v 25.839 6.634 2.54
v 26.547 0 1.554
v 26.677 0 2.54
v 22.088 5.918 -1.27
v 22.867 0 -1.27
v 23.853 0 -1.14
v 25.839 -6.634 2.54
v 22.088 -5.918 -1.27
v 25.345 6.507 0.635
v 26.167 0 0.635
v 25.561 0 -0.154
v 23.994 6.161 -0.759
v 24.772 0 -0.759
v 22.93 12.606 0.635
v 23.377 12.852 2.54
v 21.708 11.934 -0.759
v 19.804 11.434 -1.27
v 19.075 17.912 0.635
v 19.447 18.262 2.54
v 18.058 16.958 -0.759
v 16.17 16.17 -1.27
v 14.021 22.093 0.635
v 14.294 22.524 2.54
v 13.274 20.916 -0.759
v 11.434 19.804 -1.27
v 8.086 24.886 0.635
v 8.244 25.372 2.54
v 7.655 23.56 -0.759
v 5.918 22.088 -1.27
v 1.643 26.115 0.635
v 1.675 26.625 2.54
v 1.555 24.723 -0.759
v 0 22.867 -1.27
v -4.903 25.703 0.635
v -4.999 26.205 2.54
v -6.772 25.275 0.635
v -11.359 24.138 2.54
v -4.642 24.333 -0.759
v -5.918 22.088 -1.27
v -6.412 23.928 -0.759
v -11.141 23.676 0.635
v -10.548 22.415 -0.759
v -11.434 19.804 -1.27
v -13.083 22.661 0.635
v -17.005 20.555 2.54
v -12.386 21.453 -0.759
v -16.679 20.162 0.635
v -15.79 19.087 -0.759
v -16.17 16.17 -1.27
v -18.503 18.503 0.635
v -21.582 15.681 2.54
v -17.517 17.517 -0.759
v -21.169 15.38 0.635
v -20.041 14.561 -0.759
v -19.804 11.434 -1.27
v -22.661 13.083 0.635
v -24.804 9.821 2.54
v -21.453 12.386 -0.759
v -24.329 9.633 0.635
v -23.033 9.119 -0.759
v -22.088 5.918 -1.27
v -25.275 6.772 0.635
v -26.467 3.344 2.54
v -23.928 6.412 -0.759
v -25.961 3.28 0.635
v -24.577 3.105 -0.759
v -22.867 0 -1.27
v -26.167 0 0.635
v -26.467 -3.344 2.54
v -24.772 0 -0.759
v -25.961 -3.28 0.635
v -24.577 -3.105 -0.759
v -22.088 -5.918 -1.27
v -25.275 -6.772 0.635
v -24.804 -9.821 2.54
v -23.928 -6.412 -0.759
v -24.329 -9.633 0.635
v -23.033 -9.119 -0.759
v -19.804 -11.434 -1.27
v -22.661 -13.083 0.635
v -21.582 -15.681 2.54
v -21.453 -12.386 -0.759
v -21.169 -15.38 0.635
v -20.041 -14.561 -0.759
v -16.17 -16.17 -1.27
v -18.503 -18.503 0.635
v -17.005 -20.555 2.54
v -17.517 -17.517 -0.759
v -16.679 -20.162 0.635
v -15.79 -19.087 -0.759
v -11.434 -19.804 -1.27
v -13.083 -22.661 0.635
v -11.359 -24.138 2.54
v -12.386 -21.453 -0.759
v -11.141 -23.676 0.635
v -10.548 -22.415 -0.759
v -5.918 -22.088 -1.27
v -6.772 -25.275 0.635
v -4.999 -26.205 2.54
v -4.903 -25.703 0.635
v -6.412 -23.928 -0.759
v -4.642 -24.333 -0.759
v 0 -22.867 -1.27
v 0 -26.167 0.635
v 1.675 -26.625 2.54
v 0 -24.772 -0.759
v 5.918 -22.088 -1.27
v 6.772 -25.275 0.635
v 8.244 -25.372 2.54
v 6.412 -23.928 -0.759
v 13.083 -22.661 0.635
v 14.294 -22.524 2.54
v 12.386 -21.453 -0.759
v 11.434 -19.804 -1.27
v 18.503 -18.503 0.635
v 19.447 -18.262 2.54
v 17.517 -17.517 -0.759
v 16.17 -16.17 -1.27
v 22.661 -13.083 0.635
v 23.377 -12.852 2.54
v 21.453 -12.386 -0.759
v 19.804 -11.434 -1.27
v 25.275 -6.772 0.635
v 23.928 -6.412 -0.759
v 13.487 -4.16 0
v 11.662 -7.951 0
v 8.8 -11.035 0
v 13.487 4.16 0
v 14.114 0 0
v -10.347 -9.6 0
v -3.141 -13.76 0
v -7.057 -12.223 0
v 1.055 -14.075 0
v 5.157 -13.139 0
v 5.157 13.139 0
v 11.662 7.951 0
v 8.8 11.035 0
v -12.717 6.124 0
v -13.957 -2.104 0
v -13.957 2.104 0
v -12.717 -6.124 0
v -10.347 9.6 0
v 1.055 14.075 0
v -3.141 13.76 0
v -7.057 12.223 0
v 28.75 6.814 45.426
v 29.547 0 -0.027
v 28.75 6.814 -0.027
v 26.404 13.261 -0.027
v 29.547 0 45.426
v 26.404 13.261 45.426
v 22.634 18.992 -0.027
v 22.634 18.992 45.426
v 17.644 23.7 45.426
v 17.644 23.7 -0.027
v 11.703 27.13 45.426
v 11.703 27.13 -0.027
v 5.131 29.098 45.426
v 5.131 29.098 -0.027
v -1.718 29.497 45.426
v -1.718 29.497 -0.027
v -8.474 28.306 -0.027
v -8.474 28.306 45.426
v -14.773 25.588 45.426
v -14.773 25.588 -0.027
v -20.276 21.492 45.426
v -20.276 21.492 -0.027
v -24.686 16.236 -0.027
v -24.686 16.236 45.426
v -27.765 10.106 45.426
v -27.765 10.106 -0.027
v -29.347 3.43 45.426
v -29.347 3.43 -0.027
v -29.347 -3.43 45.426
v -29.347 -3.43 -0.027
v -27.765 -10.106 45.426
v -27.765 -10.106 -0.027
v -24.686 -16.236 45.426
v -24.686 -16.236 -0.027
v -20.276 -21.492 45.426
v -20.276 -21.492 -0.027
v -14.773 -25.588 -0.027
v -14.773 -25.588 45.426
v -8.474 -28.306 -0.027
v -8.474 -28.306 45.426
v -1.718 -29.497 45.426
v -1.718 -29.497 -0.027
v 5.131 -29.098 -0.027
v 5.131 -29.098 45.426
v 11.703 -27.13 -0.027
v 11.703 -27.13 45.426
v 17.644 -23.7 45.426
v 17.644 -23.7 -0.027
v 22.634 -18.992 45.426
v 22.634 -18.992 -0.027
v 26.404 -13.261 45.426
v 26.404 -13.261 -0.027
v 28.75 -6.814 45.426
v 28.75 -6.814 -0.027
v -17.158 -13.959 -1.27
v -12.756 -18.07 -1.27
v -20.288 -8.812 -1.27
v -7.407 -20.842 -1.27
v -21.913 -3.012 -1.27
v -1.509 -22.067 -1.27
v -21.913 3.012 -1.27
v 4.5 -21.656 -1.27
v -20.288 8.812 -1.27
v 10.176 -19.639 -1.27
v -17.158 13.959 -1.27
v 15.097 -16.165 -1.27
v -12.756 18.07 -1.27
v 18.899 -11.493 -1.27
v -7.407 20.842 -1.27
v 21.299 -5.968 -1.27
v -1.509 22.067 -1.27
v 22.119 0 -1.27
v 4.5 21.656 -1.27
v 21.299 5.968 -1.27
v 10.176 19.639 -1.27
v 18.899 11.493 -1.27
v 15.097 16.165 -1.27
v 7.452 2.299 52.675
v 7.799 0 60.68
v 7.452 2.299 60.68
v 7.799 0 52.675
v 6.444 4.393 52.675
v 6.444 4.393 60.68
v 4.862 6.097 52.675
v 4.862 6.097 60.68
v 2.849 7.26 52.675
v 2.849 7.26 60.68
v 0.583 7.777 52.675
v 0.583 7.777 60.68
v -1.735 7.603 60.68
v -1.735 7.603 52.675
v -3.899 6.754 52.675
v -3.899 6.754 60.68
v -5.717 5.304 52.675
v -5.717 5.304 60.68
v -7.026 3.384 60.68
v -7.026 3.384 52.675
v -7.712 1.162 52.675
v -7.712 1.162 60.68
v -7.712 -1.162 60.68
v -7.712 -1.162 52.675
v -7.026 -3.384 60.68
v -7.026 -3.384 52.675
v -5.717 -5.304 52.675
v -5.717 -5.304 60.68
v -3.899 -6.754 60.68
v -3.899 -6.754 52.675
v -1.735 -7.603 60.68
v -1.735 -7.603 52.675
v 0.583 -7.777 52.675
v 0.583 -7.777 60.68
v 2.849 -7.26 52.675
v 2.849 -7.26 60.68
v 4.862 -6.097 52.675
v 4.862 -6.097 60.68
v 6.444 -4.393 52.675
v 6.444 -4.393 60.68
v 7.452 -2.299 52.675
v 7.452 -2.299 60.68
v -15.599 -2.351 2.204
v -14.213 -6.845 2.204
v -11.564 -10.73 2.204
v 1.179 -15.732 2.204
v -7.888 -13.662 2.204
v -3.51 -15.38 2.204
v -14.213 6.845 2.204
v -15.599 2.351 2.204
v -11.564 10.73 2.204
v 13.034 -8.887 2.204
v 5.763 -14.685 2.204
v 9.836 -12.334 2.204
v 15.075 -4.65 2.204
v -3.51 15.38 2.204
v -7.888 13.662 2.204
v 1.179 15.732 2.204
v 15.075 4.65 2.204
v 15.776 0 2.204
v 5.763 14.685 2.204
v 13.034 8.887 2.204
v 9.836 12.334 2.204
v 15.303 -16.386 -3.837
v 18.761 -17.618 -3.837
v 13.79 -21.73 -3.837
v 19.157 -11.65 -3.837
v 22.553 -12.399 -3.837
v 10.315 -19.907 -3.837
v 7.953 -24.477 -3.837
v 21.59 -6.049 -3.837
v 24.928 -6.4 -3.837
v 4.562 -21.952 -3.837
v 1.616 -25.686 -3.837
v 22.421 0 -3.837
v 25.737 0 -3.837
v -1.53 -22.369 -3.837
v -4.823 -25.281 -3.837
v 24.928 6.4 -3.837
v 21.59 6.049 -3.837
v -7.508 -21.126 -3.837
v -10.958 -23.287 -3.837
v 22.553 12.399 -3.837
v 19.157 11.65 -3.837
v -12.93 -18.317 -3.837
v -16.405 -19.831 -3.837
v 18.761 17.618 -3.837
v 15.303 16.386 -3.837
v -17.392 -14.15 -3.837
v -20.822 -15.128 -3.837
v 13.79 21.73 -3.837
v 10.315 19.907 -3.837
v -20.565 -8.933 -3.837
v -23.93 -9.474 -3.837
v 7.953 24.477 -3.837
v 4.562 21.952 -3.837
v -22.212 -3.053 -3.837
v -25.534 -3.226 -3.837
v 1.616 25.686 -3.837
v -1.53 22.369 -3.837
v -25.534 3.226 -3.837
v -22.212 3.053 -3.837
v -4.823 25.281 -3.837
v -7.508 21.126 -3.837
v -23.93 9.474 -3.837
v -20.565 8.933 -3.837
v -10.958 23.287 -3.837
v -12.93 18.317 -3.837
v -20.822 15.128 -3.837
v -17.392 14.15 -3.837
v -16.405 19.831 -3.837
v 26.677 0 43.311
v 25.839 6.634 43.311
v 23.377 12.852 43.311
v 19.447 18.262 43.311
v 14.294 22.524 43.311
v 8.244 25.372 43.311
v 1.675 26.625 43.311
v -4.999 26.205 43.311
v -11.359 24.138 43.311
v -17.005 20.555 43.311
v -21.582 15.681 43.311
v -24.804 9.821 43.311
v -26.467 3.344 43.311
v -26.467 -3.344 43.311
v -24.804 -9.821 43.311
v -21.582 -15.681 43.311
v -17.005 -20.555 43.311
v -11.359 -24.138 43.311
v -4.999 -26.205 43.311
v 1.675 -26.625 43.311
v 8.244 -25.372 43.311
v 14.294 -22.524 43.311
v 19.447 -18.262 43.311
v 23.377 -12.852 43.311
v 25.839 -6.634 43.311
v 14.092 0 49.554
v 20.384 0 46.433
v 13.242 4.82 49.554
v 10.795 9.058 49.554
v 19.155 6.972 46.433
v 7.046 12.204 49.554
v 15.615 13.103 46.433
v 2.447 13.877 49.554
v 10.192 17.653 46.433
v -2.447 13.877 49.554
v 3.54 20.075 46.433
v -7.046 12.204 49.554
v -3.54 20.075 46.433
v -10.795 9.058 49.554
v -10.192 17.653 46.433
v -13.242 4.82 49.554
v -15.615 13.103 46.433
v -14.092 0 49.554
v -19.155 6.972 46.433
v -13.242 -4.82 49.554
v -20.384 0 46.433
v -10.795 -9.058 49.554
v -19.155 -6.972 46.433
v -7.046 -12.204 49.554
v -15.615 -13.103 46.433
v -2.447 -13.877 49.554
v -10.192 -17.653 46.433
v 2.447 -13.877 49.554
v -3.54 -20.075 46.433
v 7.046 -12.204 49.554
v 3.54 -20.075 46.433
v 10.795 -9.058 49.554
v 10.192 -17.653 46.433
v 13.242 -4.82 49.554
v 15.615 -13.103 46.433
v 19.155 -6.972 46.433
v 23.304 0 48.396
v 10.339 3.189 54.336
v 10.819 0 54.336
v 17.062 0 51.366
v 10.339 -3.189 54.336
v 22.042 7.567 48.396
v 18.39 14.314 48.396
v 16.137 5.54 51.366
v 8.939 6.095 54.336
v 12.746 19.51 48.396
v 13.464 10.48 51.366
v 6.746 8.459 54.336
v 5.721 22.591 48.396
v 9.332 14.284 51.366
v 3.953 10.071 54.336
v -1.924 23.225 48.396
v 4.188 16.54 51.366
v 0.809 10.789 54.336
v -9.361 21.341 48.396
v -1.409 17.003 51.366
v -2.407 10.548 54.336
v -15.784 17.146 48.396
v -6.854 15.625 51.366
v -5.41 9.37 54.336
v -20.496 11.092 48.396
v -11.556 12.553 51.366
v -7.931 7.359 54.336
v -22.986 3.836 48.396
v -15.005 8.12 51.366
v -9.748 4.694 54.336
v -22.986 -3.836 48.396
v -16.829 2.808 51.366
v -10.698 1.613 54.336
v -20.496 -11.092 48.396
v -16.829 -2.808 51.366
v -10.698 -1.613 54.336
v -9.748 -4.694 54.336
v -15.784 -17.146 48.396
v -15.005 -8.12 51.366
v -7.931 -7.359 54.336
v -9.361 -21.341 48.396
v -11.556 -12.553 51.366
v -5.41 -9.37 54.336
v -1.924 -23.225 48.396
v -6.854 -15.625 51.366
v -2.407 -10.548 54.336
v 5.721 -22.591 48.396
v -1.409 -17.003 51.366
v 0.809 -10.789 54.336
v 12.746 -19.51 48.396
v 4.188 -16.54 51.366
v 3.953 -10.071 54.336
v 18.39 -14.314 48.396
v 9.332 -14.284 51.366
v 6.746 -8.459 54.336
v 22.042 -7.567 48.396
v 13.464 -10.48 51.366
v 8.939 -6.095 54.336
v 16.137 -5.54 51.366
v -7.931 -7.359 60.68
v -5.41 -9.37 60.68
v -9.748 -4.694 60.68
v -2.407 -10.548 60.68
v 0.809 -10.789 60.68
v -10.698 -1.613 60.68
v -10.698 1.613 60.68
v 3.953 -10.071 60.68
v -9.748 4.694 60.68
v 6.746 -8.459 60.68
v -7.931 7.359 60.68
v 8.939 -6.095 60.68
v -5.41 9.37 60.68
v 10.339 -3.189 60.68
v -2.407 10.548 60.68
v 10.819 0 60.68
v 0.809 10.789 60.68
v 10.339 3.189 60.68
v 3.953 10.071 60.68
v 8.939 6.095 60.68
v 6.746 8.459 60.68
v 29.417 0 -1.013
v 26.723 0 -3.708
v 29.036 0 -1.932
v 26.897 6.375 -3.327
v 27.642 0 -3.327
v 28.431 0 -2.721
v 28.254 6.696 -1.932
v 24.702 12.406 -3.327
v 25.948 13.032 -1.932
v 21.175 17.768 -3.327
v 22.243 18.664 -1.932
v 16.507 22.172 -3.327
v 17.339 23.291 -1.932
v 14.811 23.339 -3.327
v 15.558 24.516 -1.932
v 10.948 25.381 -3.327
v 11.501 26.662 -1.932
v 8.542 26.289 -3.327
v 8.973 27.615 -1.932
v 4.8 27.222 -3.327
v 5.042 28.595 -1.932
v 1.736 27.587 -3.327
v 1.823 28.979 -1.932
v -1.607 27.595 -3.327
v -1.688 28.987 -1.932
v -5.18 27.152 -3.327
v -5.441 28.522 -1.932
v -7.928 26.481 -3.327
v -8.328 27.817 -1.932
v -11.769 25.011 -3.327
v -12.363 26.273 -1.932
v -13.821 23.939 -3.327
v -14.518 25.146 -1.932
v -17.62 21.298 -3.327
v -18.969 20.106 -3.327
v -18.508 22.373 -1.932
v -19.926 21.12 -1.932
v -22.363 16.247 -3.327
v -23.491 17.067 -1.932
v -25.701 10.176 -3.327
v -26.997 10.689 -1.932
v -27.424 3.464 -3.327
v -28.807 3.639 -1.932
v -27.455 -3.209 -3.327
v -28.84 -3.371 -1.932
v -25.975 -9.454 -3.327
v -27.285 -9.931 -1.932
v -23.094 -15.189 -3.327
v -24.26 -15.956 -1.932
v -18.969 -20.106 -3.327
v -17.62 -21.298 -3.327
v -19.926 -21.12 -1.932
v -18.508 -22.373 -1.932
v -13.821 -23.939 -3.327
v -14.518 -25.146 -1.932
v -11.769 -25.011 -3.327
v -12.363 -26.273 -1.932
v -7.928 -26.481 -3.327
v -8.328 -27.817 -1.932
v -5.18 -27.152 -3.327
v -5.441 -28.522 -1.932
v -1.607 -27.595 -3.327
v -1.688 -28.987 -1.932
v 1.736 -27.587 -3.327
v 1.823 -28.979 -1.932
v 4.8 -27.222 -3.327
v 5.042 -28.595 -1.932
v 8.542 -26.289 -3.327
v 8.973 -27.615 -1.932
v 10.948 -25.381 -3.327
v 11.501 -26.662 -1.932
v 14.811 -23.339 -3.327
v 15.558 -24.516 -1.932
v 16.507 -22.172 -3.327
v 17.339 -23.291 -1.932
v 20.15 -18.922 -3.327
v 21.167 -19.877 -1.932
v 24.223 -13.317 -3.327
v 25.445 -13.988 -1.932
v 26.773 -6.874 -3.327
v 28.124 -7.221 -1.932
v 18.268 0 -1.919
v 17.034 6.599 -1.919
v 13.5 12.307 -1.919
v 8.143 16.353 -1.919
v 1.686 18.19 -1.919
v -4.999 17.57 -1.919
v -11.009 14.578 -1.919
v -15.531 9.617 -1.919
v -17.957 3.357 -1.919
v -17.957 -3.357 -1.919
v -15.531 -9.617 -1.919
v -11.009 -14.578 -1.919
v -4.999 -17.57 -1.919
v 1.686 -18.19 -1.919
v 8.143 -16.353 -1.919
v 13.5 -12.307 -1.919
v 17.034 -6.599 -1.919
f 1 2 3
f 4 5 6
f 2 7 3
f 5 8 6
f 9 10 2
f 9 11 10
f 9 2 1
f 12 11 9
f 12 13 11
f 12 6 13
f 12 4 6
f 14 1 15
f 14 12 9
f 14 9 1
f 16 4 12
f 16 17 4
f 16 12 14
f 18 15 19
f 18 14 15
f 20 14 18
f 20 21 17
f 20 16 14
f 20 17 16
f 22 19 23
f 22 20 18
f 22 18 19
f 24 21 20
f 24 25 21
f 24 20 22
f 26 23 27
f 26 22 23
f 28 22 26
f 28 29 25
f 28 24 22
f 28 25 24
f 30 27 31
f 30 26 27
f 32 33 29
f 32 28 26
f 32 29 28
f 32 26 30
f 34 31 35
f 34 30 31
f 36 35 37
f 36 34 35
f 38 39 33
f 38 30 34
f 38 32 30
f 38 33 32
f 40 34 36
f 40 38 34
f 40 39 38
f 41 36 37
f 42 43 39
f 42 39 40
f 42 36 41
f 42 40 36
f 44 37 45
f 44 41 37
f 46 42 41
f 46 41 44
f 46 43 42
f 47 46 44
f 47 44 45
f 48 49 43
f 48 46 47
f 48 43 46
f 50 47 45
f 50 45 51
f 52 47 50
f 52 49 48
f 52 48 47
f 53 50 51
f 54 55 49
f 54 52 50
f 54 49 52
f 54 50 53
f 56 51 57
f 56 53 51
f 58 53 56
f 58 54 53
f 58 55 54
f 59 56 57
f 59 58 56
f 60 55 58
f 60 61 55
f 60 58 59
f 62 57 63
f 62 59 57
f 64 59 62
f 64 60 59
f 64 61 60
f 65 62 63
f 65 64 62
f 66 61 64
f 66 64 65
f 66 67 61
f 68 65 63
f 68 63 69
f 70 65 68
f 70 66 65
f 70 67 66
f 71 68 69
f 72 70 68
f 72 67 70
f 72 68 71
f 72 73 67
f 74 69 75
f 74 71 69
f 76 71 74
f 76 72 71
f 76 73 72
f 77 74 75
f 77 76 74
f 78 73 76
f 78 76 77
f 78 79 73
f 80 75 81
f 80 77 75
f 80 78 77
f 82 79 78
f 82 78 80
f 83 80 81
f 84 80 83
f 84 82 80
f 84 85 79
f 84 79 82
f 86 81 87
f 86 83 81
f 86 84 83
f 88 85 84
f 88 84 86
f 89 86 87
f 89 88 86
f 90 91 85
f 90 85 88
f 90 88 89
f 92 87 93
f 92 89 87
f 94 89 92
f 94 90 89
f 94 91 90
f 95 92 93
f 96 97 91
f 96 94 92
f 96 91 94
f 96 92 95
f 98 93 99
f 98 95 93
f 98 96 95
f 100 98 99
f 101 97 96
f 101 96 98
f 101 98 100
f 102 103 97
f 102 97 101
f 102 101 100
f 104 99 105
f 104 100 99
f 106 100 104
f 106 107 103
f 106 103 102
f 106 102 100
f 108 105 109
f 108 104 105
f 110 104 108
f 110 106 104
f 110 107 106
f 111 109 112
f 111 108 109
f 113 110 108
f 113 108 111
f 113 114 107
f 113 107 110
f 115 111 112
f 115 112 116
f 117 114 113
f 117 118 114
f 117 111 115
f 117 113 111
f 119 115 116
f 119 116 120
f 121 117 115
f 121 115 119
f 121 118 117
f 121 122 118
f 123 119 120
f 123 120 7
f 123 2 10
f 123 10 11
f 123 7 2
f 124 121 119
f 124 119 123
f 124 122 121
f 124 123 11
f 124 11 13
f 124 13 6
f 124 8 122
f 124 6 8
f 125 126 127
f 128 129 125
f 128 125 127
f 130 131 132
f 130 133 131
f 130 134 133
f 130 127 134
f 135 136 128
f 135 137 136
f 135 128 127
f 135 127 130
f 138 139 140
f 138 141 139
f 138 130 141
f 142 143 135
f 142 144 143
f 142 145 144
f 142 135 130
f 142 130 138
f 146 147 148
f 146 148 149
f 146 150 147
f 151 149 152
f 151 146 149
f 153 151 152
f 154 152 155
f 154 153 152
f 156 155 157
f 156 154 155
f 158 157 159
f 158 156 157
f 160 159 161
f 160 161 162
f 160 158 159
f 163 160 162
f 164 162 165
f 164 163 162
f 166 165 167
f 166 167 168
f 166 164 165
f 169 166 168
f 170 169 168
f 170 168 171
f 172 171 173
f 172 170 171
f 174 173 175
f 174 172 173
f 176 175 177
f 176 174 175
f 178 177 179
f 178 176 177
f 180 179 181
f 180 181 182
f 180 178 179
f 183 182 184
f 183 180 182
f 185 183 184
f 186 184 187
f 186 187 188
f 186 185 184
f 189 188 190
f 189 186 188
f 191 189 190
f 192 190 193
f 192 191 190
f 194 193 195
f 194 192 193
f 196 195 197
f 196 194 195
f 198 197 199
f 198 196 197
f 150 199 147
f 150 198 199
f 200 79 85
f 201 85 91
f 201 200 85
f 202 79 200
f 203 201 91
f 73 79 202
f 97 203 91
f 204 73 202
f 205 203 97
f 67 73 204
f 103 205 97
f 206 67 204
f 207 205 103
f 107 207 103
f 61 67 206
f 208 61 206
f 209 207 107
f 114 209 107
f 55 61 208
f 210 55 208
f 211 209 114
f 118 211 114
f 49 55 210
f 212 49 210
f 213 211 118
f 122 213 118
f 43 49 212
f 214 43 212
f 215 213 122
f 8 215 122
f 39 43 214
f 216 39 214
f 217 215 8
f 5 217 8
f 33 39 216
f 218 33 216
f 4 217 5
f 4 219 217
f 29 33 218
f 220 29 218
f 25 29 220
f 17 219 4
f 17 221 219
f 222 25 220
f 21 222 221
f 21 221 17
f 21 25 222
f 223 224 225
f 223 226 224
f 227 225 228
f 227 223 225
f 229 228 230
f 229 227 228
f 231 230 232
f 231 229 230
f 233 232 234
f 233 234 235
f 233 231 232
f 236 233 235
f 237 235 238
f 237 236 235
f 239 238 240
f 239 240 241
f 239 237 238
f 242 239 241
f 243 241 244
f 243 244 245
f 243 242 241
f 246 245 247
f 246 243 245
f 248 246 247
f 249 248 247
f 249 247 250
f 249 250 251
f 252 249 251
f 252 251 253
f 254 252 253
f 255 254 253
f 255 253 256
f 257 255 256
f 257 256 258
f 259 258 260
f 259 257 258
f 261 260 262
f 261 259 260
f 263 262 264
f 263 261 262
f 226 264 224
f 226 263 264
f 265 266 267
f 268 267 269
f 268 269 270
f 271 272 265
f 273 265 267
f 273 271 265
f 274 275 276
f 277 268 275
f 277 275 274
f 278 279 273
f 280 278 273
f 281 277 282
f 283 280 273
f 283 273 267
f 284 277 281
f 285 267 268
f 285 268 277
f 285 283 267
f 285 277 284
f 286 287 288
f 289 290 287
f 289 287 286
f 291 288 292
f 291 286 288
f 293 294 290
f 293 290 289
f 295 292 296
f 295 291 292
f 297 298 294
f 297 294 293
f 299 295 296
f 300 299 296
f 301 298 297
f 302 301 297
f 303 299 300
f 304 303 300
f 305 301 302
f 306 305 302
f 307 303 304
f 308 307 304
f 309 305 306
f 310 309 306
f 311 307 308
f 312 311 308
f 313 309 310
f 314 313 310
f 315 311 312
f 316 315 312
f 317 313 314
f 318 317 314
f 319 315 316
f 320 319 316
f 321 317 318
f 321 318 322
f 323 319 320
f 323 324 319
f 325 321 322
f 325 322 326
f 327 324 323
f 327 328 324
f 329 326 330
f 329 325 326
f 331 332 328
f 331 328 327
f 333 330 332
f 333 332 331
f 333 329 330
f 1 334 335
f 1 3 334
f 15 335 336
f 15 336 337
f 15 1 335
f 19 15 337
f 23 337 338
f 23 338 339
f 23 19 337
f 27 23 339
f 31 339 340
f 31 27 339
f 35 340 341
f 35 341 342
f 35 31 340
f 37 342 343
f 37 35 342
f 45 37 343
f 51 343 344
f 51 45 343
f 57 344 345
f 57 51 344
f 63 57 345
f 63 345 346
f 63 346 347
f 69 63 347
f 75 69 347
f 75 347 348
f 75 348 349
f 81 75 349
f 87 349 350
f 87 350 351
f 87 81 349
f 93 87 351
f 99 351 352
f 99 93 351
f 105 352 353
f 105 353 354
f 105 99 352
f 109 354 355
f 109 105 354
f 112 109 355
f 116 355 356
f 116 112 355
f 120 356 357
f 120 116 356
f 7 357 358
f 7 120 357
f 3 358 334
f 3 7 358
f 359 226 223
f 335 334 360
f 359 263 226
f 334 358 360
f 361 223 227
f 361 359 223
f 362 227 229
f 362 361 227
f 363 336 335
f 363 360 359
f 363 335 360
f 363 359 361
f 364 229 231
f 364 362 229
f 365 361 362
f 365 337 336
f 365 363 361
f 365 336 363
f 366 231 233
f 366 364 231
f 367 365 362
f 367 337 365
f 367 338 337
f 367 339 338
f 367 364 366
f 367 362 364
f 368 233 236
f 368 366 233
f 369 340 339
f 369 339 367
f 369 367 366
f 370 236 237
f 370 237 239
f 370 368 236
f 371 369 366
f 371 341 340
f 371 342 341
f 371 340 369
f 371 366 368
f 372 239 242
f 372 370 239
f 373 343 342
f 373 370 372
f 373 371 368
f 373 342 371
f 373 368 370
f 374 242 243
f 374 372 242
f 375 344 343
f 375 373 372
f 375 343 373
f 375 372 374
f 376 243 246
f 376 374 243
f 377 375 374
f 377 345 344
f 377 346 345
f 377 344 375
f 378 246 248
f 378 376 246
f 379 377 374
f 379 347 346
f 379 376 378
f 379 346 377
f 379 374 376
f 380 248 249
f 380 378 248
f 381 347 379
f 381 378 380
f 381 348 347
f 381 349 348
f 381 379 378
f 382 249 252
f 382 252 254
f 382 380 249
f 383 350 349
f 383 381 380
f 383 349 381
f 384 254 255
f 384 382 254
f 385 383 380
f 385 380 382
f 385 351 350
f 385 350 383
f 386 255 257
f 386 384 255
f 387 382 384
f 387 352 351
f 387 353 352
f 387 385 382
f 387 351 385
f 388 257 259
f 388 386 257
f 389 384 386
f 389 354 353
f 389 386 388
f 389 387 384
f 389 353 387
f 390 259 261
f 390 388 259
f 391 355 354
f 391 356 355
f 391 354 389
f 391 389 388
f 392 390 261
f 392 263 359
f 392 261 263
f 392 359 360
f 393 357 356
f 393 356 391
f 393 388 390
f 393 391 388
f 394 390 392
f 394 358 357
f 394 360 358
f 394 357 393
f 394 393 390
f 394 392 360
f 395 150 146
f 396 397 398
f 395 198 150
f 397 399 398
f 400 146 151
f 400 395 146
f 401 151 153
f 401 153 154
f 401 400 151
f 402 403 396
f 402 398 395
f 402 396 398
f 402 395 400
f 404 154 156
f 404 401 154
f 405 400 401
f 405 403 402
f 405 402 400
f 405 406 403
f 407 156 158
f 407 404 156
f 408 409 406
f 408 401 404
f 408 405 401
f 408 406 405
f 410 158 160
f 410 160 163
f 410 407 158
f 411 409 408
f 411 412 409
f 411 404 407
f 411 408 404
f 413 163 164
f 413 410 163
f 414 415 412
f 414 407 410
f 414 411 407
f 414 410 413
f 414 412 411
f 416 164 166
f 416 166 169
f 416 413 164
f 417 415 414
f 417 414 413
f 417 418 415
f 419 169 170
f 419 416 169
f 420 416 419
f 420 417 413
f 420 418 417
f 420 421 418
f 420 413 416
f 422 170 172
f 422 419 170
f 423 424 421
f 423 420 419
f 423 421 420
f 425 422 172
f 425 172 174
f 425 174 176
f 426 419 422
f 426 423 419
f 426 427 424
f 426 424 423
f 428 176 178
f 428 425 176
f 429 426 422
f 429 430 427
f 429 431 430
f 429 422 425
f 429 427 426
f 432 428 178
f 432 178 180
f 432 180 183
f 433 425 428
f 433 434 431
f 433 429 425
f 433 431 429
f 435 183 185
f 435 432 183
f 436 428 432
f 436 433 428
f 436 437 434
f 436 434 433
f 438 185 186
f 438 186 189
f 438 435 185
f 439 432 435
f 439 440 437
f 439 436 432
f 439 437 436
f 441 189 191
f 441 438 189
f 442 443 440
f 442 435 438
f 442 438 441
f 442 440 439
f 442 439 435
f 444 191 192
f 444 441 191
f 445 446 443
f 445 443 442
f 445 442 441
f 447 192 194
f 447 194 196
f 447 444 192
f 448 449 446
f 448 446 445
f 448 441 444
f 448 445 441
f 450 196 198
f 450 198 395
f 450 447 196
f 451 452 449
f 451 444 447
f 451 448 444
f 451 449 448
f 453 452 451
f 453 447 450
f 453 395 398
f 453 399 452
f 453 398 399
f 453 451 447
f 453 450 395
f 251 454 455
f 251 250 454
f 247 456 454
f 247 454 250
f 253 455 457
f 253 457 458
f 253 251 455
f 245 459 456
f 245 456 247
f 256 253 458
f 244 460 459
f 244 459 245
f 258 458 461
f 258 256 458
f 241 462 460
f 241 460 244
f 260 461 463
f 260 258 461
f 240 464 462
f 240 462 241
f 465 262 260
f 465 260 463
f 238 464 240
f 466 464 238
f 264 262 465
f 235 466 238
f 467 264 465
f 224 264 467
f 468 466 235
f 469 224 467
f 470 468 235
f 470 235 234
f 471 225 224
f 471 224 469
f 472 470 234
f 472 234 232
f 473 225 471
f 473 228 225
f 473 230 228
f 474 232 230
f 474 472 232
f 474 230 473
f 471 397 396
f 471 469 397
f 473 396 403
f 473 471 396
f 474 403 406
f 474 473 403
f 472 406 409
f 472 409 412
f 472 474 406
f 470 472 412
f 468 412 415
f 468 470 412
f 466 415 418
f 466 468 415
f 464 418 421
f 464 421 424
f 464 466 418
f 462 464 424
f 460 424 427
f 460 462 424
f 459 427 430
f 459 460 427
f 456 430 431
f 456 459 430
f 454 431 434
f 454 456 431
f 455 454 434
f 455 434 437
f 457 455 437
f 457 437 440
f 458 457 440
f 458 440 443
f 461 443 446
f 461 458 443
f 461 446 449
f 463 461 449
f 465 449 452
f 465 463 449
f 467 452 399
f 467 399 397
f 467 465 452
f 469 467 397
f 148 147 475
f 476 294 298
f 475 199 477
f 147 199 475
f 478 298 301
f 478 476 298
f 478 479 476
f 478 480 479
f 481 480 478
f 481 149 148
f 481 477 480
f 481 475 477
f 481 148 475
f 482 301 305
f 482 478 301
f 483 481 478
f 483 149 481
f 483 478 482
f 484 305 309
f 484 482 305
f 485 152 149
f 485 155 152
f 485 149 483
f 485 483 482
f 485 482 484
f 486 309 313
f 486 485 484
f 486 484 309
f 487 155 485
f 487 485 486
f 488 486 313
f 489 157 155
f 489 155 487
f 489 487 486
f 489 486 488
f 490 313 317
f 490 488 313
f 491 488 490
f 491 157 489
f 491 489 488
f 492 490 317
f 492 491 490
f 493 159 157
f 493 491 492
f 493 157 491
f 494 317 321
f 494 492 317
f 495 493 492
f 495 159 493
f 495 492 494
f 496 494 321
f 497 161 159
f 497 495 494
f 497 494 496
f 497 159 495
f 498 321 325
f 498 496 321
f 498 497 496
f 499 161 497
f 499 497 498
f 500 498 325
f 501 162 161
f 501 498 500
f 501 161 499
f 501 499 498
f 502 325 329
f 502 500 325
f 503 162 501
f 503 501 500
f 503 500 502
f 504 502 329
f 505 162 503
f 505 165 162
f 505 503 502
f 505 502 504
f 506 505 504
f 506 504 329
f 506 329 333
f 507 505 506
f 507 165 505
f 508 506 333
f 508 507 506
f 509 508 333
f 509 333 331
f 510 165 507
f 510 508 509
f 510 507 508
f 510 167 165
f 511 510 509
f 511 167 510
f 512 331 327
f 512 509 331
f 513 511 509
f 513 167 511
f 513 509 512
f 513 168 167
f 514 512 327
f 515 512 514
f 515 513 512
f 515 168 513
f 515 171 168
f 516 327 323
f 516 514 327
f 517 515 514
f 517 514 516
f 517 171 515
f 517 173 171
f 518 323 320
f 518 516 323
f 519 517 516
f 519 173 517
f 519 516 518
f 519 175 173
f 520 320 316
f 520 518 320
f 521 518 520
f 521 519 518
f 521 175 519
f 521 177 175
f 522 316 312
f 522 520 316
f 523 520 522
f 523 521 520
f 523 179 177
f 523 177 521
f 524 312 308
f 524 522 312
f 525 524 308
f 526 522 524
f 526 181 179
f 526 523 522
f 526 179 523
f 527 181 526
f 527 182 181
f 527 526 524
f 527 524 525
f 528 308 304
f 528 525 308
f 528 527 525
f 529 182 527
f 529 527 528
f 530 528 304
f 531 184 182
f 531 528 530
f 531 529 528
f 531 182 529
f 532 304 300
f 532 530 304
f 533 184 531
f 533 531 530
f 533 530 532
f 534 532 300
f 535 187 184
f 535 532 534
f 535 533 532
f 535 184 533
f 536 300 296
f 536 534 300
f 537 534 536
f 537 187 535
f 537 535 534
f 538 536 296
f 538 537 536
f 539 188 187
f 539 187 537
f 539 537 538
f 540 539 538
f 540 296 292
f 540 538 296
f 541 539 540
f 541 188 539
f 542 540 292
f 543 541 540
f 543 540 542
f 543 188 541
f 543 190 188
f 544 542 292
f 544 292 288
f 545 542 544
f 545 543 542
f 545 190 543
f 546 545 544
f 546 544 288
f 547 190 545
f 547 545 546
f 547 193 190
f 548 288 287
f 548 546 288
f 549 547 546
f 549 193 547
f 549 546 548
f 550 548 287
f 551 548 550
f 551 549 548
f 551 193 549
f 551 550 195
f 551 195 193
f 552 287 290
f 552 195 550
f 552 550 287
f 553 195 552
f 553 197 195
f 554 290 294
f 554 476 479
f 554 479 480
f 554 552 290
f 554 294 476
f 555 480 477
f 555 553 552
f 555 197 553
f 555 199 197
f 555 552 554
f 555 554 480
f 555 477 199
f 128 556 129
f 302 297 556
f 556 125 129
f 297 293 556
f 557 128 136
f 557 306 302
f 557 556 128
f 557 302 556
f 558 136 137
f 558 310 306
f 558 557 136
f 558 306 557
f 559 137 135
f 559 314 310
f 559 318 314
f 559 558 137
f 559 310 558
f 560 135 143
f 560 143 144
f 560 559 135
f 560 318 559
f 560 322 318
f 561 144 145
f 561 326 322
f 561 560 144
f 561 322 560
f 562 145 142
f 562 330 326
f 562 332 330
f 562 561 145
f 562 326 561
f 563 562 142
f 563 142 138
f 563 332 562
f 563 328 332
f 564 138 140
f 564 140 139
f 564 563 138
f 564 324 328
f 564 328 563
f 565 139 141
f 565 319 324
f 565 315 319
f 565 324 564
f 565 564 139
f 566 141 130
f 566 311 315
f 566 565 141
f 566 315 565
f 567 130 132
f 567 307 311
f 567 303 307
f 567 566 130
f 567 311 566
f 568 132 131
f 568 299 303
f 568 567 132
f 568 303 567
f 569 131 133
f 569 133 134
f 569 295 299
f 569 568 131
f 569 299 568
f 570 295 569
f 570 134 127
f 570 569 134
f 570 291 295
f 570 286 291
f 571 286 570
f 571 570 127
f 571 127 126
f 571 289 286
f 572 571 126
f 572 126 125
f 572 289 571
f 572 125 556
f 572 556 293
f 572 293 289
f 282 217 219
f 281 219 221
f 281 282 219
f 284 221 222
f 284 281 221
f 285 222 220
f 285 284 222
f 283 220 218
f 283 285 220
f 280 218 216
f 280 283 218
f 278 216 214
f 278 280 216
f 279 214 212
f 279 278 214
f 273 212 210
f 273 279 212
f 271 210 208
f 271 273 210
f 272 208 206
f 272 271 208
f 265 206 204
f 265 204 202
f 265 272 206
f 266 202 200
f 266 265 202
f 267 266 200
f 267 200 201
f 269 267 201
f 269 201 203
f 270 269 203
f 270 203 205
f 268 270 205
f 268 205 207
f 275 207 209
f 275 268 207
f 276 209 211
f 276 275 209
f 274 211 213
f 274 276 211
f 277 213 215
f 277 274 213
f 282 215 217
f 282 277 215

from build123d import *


with BuildPart() as f1:
    # F0 (on Front) → F1 (revolve)
    with BuildSketch(Plane.XZ):
        with BuildLine():
            Line((0, 2.203822), (0, 0))
            Line((0, 0), (14.114344, 0))
            Line((14.114344, 0), (22.420958, -3.83735))
            Line((22.420958, -3.83735), (25.736834, -3.83735))
            ThreePointArc((25.736834, -3.83735), (28.430911, -2.721426), (29.546834, -0.02735))
            Line((29.546834, -0.02735), (29.546834, 45.425702))
            Line((29.546834, 45.425702), (10.819199, 54.336432))
            Line((10.819199, 54.336432), (10.819199, 60.679659))
            Line((10.819199, 60.679659), (7.798612, 60.679659))
            Line((7.798612, 60.679659), (7.798612, 52.675109))
            Line((7.798612, 52.675109), (26.677277, 43.31129))
            Line((26.677277, 43.31129), (26.677277, 2.540149))
            ThreePointArc((26.677277, 2.540149), (25.561354, -0.153928), (22.867277, -1.269851))
            Line((22.867277, -1.269851), (22.118898, -1.269851))
            Line((22.118898, -1.269851), (15.775668, 2.203822))
            Line((15.775668, 2.203822), (0, 2.203822))
        make_face()
    revolve(axis=Axis((0, 0, 30.669179), (0, 0, 1)))


solid = f1.part
